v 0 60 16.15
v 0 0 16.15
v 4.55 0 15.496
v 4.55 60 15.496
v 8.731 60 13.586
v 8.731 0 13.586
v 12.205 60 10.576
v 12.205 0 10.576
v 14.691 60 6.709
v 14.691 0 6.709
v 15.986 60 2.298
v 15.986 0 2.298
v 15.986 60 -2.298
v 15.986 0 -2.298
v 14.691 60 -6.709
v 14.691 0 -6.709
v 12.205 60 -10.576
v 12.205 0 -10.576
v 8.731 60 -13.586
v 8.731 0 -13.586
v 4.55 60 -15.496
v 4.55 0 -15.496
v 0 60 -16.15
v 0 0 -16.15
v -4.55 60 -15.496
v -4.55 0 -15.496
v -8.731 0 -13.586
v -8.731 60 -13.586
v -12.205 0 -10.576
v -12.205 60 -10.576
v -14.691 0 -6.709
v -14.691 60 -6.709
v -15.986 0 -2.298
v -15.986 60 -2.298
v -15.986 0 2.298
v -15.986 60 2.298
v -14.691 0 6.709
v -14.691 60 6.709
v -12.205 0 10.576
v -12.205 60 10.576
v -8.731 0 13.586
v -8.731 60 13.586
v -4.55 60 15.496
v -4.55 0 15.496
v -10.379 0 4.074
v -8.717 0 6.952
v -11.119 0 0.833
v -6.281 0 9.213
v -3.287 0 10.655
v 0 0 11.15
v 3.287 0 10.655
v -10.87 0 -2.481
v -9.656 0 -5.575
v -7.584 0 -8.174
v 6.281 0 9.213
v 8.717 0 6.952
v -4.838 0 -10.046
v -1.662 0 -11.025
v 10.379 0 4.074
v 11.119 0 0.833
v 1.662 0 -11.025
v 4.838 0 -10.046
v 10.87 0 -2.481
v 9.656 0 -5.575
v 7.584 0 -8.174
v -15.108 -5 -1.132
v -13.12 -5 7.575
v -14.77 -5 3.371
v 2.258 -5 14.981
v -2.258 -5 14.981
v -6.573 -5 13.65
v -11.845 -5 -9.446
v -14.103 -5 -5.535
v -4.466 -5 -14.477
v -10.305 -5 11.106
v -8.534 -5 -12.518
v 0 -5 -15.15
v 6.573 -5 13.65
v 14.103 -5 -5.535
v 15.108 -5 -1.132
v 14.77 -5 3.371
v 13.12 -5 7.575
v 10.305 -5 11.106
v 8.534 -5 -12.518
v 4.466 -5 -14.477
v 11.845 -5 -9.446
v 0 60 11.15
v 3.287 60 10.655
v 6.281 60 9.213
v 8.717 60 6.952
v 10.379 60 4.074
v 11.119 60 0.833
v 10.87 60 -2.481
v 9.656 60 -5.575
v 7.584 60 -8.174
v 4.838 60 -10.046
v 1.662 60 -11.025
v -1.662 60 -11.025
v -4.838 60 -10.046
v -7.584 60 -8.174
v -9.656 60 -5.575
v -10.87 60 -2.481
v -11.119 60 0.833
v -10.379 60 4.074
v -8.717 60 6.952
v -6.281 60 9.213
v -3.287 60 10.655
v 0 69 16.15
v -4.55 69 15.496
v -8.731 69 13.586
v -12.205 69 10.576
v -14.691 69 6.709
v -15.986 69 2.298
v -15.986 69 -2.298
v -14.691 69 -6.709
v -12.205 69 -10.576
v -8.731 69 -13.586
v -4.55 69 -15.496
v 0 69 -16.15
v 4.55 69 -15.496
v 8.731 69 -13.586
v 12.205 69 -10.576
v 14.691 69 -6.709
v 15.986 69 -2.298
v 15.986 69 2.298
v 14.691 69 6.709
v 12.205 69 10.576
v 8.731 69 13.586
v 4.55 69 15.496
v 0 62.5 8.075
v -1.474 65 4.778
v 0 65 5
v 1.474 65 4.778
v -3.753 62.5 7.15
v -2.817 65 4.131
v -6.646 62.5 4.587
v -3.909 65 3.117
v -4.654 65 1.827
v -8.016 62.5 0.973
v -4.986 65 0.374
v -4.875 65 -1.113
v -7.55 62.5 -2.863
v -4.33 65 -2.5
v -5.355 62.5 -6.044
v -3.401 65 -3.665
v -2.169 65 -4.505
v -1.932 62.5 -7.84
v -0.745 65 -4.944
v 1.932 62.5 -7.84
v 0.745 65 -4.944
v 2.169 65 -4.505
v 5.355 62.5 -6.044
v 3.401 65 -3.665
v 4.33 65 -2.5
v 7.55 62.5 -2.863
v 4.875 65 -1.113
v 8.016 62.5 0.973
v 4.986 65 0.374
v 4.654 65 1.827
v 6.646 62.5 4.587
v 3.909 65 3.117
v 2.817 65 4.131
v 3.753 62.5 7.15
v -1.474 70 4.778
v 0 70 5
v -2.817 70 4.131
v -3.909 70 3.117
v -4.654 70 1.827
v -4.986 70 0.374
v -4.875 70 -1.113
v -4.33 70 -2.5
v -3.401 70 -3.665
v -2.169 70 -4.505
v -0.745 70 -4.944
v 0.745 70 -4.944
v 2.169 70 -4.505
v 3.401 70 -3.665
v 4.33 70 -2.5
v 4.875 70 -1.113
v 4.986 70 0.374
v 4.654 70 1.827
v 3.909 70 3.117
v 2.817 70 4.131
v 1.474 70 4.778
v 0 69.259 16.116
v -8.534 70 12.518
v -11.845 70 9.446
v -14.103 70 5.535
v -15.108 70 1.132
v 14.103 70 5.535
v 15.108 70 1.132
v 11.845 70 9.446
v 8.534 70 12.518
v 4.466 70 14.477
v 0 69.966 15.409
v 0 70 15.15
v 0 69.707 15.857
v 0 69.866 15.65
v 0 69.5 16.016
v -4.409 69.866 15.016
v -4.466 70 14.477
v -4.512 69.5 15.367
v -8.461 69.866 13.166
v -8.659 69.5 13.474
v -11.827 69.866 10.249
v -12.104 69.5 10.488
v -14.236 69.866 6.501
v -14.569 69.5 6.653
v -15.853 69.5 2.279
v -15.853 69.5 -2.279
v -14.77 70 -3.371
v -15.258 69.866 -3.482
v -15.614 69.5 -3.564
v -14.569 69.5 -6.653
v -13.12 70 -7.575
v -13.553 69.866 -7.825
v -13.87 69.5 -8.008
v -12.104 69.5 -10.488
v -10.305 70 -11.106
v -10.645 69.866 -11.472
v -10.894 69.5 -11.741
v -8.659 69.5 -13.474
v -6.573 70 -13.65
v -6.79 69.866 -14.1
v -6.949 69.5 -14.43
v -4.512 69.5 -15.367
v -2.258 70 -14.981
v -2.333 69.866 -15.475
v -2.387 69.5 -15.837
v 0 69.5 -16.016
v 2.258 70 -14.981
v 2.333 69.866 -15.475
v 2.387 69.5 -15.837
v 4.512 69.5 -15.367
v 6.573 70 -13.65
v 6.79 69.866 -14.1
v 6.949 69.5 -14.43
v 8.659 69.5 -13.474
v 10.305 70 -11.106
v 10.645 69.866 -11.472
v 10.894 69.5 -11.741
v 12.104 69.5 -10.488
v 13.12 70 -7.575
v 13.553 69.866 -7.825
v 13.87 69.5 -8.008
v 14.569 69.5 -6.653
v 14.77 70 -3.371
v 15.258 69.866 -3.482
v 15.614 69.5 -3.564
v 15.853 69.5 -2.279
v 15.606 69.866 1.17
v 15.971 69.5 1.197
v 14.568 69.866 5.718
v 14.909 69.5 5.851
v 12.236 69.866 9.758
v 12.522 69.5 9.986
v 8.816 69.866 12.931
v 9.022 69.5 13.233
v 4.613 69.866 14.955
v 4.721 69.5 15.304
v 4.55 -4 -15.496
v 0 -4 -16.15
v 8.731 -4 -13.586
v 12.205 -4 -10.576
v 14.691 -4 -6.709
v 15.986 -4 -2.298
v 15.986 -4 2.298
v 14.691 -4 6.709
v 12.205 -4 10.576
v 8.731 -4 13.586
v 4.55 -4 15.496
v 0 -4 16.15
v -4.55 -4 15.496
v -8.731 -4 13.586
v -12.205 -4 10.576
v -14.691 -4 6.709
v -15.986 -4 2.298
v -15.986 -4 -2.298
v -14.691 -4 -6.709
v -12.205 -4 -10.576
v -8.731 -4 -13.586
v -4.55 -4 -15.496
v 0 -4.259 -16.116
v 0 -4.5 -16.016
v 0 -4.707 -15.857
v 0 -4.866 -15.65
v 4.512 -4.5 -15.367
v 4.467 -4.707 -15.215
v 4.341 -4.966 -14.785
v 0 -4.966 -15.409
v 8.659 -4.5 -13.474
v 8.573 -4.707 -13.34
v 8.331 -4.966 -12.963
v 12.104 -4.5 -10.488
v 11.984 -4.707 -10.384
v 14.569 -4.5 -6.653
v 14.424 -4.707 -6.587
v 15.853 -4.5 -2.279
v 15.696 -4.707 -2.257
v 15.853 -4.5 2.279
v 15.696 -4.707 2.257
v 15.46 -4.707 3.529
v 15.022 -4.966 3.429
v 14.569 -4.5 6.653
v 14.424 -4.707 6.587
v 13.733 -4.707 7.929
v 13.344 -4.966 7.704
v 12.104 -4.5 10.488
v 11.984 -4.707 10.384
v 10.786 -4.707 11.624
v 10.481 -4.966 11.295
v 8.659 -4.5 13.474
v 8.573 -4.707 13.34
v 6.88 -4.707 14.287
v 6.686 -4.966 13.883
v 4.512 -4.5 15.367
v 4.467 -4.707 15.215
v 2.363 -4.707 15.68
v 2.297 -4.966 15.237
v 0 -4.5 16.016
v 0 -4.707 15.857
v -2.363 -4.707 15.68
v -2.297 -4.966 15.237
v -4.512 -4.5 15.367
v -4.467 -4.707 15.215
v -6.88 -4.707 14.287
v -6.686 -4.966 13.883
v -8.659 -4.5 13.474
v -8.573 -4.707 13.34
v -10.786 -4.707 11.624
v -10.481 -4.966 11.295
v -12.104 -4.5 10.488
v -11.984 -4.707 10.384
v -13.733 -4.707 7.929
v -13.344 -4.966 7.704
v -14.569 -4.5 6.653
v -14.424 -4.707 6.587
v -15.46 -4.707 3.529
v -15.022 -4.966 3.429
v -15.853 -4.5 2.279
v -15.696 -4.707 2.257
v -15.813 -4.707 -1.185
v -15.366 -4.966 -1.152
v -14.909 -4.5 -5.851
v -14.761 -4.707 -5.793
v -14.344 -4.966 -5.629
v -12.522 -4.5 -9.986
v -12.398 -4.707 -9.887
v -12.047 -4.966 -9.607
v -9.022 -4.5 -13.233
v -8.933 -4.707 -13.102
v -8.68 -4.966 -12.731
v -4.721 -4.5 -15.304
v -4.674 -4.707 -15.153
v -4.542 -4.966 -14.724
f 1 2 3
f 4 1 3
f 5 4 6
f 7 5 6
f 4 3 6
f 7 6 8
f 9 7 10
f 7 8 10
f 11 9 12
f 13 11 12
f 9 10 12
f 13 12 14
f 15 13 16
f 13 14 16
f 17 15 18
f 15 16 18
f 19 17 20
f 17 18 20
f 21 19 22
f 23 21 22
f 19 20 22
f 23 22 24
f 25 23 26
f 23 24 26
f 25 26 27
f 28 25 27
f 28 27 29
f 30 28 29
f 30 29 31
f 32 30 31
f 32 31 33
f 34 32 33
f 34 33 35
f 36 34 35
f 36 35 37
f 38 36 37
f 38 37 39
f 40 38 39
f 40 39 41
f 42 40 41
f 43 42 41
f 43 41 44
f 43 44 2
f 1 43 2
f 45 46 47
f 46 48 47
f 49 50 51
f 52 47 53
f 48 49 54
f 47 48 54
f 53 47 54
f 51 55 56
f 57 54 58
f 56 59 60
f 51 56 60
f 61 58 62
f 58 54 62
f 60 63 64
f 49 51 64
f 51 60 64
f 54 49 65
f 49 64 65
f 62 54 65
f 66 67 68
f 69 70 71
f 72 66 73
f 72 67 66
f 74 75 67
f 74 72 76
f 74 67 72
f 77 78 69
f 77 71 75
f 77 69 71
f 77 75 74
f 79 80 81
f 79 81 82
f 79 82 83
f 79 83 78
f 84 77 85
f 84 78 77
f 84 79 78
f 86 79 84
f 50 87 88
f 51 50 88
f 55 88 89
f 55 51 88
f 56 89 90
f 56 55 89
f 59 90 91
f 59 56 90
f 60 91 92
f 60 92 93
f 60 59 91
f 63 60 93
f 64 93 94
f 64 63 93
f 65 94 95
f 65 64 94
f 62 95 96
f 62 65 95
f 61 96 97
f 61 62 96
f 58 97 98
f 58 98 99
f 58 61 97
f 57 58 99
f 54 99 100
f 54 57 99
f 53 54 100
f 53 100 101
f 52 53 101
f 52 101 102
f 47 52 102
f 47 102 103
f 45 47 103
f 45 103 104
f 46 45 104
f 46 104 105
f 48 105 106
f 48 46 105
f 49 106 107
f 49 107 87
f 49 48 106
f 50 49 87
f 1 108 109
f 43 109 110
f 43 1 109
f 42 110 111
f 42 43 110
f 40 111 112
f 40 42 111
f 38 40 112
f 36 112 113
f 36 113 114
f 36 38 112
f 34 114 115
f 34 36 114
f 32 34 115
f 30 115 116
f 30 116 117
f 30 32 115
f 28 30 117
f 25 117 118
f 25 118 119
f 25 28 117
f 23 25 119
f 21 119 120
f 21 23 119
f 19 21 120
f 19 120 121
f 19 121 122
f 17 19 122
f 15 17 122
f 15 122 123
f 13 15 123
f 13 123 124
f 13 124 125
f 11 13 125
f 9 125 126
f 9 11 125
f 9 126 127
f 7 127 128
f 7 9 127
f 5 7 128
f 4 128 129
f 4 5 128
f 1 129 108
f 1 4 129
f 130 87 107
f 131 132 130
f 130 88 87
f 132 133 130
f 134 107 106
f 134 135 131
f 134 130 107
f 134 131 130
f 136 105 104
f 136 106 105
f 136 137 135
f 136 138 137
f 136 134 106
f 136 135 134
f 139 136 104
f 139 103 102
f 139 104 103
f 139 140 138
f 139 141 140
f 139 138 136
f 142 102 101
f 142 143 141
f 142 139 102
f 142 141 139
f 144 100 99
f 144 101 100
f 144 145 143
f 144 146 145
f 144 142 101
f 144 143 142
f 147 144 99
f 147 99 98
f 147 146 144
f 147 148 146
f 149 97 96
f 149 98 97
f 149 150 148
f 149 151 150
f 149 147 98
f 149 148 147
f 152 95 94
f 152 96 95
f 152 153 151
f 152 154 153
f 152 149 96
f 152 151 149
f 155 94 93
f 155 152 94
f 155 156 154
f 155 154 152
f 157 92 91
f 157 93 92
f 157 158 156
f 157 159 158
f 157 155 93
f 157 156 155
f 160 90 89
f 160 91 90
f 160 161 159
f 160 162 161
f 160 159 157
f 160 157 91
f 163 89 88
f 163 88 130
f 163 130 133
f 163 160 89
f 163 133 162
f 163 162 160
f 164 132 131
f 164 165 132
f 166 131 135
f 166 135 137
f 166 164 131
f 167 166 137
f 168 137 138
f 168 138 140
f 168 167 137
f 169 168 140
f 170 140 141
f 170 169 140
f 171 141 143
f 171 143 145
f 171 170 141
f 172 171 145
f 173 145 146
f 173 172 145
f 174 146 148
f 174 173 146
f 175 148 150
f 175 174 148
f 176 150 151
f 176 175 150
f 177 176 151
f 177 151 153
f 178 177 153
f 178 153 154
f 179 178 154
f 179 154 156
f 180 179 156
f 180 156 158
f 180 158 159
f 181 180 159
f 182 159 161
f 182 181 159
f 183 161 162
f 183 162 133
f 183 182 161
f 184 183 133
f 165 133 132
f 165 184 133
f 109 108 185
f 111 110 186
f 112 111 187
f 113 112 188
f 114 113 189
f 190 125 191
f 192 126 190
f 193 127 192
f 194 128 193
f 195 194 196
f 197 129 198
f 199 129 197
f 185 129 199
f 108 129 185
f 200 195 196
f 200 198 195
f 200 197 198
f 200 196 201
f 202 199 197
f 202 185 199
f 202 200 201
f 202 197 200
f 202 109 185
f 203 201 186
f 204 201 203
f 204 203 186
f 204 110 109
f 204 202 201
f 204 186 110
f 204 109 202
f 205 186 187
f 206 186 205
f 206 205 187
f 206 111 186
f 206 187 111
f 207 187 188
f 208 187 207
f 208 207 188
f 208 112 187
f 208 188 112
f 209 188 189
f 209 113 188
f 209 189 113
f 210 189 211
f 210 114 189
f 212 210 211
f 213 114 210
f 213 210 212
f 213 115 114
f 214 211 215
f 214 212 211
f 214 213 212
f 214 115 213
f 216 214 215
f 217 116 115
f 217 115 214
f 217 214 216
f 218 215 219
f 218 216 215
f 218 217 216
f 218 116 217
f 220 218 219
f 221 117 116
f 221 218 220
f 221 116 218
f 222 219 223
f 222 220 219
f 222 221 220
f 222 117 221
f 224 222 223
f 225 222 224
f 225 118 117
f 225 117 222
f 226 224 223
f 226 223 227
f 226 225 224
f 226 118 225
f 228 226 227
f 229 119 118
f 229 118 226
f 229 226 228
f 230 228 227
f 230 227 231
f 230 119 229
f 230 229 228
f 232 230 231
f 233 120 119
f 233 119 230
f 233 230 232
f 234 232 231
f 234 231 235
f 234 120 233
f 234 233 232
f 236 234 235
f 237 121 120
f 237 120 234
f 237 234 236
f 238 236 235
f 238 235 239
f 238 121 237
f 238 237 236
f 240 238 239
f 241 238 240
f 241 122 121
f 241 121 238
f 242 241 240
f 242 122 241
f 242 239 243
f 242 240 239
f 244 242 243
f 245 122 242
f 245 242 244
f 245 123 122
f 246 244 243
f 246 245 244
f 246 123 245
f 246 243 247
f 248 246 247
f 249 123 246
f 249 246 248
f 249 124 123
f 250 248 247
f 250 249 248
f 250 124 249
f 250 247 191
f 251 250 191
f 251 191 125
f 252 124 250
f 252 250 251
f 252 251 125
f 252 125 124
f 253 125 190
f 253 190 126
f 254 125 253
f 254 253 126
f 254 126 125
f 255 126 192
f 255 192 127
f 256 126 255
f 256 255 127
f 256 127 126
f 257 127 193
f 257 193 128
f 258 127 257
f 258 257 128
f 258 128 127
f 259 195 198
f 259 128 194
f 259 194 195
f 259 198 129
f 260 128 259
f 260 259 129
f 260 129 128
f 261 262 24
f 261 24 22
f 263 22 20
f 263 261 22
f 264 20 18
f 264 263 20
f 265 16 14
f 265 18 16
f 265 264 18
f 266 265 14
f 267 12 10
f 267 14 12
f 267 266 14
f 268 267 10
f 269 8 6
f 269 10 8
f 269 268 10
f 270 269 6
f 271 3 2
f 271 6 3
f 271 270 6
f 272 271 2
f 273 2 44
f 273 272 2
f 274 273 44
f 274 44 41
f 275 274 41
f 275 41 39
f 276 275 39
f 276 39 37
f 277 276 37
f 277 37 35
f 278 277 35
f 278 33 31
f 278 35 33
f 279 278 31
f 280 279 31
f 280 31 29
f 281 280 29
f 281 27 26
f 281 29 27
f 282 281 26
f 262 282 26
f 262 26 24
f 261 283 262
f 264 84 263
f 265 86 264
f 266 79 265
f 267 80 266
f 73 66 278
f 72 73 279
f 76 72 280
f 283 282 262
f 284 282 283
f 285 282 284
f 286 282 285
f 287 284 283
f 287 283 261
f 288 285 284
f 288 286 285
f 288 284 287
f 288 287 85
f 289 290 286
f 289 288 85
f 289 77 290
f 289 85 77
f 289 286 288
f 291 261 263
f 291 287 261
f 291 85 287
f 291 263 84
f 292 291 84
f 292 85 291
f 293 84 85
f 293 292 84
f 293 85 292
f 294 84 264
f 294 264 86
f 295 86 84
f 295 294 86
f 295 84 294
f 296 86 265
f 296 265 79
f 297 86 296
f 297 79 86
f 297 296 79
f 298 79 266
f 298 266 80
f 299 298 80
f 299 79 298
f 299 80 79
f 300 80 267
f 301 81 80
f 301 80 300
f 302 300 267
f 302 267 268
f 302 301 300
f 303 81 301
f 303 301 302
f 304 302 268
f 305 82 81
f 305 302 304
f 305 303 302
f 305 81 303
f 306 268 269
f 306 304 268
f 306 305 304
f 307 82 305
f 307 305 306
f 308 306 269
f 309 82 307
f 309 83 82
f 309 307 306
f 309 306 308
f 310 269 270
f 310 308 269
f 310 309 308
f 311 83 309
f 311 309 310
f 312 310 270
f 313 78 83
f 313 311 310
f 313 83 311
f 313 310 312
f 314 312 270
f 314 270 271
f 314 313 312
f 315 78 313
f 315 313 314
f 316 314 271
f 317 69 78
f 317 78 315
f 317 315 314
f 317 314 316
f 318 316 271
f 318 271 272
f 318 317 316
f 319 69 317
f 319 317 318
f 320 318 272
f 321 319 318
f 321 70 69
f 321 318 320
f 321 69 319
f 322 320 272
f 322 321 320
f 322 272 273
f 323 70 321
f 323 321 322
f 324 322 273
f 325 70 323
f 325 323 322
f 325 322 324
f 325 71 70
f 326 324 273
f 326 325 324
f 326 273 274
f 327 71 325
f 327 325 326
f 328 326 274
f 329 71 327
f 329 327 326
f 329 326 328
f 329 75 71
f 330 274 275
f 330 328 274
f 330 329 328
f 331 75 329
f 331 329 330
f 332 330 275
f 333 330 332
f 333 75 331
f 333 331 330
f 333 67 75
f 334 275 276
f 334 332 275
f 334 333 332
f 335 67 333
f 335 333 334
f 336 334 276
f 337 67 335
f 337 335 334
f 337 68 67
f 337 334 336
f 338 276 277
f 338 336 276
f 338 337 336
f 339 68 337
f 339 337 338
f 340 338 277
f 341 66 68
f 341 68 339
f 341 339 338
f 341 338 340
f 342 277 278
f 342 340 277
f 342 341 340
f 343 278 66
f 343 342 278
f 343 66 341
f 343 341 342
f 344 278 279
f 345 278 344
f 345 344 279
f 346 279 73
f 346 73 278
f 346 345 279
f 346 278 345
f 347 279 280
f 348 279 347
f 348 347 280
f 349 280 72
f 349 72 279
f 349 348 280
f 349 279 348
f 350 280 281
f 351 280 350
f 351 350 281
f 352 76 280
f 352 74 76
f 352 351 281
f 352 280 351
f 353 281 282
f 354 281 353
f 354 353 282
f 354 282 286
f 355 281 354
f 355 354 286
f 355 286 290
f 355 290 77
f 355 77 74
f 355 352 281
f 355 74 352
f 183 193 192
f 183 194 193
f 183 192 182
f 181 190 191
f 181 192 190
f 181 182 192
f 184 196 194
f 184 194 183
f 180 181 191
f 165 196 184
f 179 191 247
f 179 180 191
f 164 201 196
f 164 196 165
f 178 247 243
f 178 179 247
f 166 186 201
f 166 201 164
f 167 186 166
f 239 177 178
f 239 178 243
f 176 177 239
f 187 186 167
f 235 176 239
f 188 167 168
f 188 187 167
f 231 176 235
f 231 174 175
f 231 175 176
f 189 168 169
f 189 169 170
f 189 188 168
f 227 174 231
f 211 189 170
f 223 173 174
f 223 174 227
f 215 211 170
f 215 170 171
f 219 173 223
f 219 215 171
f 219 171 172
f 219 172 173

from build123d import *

# Parameters (mm, degrees)
SKETCH1_R           = 16.15
SKETCH1_R_2         = 11.15
BOSS_EXTRUDE1_DEPTH = 60
BOSS_EXTRUDE2_START = 5
SKETCH2_R           = 16.15
BOSS_EXTRUDE2_DEPTH = 5
FILLET1_R           = 1


with BuildPart() as part:
    # Sketch1 → Boss-Extrude1 (new body)
    with BuildSketch(Plane(origin=(0, 0, 0), x_dir=(1, 0, 0), z_dir=(0, 1, 0))):
        with Locations(Location((0, 0, 0), (0, 0, 270))):
            Circle(SKETCH1_R)
        with Locations(Location((0, 0, 0), (0, 0, 270))):
            Circle(SKETCH1_R_2, mode=Mode.SUBTRACT)
    extrude(amount=BOSS_EXTRUDE1_DEPTH)

    # Sketch2 → Boss-Extrude2 (add)
    with BuildSketch(Plane.XZ.offset(BOSS_EXTRUDE2_START)):
        with Locations(Location((0, 0, 0), (0, 0, 270))):
            Circle(SKETCH2_R)
    extrude(amount=-BOSS_EXTRUDE2_DEPTH)

    # Sketch3 → Revolve1 (revolve)
    with BuildSketch(Plane.XY, mode=Mode.PRIVATE) as revolve1_sk:
        Polygon((-11.15, 60), (-5, 65), (-5, 70), (-16.15, 70), (-16.15, 60), align=None)
    revolve(revolve1_sk.sketch.rotate(Axis((0, 60, 0), (0, -1, 0)), 270), axis=Axis((0, 60, 0), (0, -1, 0)))

    # Fillet1
    fillet1_edges = [part.edges().sort_by_distance(p)[0] for p in [
        (0, 70, -16.15),
        (0, -5, 16.15),
    ]]
    fillet(fillet1_edges, radius=FILLET1_R)


solid = part.part
